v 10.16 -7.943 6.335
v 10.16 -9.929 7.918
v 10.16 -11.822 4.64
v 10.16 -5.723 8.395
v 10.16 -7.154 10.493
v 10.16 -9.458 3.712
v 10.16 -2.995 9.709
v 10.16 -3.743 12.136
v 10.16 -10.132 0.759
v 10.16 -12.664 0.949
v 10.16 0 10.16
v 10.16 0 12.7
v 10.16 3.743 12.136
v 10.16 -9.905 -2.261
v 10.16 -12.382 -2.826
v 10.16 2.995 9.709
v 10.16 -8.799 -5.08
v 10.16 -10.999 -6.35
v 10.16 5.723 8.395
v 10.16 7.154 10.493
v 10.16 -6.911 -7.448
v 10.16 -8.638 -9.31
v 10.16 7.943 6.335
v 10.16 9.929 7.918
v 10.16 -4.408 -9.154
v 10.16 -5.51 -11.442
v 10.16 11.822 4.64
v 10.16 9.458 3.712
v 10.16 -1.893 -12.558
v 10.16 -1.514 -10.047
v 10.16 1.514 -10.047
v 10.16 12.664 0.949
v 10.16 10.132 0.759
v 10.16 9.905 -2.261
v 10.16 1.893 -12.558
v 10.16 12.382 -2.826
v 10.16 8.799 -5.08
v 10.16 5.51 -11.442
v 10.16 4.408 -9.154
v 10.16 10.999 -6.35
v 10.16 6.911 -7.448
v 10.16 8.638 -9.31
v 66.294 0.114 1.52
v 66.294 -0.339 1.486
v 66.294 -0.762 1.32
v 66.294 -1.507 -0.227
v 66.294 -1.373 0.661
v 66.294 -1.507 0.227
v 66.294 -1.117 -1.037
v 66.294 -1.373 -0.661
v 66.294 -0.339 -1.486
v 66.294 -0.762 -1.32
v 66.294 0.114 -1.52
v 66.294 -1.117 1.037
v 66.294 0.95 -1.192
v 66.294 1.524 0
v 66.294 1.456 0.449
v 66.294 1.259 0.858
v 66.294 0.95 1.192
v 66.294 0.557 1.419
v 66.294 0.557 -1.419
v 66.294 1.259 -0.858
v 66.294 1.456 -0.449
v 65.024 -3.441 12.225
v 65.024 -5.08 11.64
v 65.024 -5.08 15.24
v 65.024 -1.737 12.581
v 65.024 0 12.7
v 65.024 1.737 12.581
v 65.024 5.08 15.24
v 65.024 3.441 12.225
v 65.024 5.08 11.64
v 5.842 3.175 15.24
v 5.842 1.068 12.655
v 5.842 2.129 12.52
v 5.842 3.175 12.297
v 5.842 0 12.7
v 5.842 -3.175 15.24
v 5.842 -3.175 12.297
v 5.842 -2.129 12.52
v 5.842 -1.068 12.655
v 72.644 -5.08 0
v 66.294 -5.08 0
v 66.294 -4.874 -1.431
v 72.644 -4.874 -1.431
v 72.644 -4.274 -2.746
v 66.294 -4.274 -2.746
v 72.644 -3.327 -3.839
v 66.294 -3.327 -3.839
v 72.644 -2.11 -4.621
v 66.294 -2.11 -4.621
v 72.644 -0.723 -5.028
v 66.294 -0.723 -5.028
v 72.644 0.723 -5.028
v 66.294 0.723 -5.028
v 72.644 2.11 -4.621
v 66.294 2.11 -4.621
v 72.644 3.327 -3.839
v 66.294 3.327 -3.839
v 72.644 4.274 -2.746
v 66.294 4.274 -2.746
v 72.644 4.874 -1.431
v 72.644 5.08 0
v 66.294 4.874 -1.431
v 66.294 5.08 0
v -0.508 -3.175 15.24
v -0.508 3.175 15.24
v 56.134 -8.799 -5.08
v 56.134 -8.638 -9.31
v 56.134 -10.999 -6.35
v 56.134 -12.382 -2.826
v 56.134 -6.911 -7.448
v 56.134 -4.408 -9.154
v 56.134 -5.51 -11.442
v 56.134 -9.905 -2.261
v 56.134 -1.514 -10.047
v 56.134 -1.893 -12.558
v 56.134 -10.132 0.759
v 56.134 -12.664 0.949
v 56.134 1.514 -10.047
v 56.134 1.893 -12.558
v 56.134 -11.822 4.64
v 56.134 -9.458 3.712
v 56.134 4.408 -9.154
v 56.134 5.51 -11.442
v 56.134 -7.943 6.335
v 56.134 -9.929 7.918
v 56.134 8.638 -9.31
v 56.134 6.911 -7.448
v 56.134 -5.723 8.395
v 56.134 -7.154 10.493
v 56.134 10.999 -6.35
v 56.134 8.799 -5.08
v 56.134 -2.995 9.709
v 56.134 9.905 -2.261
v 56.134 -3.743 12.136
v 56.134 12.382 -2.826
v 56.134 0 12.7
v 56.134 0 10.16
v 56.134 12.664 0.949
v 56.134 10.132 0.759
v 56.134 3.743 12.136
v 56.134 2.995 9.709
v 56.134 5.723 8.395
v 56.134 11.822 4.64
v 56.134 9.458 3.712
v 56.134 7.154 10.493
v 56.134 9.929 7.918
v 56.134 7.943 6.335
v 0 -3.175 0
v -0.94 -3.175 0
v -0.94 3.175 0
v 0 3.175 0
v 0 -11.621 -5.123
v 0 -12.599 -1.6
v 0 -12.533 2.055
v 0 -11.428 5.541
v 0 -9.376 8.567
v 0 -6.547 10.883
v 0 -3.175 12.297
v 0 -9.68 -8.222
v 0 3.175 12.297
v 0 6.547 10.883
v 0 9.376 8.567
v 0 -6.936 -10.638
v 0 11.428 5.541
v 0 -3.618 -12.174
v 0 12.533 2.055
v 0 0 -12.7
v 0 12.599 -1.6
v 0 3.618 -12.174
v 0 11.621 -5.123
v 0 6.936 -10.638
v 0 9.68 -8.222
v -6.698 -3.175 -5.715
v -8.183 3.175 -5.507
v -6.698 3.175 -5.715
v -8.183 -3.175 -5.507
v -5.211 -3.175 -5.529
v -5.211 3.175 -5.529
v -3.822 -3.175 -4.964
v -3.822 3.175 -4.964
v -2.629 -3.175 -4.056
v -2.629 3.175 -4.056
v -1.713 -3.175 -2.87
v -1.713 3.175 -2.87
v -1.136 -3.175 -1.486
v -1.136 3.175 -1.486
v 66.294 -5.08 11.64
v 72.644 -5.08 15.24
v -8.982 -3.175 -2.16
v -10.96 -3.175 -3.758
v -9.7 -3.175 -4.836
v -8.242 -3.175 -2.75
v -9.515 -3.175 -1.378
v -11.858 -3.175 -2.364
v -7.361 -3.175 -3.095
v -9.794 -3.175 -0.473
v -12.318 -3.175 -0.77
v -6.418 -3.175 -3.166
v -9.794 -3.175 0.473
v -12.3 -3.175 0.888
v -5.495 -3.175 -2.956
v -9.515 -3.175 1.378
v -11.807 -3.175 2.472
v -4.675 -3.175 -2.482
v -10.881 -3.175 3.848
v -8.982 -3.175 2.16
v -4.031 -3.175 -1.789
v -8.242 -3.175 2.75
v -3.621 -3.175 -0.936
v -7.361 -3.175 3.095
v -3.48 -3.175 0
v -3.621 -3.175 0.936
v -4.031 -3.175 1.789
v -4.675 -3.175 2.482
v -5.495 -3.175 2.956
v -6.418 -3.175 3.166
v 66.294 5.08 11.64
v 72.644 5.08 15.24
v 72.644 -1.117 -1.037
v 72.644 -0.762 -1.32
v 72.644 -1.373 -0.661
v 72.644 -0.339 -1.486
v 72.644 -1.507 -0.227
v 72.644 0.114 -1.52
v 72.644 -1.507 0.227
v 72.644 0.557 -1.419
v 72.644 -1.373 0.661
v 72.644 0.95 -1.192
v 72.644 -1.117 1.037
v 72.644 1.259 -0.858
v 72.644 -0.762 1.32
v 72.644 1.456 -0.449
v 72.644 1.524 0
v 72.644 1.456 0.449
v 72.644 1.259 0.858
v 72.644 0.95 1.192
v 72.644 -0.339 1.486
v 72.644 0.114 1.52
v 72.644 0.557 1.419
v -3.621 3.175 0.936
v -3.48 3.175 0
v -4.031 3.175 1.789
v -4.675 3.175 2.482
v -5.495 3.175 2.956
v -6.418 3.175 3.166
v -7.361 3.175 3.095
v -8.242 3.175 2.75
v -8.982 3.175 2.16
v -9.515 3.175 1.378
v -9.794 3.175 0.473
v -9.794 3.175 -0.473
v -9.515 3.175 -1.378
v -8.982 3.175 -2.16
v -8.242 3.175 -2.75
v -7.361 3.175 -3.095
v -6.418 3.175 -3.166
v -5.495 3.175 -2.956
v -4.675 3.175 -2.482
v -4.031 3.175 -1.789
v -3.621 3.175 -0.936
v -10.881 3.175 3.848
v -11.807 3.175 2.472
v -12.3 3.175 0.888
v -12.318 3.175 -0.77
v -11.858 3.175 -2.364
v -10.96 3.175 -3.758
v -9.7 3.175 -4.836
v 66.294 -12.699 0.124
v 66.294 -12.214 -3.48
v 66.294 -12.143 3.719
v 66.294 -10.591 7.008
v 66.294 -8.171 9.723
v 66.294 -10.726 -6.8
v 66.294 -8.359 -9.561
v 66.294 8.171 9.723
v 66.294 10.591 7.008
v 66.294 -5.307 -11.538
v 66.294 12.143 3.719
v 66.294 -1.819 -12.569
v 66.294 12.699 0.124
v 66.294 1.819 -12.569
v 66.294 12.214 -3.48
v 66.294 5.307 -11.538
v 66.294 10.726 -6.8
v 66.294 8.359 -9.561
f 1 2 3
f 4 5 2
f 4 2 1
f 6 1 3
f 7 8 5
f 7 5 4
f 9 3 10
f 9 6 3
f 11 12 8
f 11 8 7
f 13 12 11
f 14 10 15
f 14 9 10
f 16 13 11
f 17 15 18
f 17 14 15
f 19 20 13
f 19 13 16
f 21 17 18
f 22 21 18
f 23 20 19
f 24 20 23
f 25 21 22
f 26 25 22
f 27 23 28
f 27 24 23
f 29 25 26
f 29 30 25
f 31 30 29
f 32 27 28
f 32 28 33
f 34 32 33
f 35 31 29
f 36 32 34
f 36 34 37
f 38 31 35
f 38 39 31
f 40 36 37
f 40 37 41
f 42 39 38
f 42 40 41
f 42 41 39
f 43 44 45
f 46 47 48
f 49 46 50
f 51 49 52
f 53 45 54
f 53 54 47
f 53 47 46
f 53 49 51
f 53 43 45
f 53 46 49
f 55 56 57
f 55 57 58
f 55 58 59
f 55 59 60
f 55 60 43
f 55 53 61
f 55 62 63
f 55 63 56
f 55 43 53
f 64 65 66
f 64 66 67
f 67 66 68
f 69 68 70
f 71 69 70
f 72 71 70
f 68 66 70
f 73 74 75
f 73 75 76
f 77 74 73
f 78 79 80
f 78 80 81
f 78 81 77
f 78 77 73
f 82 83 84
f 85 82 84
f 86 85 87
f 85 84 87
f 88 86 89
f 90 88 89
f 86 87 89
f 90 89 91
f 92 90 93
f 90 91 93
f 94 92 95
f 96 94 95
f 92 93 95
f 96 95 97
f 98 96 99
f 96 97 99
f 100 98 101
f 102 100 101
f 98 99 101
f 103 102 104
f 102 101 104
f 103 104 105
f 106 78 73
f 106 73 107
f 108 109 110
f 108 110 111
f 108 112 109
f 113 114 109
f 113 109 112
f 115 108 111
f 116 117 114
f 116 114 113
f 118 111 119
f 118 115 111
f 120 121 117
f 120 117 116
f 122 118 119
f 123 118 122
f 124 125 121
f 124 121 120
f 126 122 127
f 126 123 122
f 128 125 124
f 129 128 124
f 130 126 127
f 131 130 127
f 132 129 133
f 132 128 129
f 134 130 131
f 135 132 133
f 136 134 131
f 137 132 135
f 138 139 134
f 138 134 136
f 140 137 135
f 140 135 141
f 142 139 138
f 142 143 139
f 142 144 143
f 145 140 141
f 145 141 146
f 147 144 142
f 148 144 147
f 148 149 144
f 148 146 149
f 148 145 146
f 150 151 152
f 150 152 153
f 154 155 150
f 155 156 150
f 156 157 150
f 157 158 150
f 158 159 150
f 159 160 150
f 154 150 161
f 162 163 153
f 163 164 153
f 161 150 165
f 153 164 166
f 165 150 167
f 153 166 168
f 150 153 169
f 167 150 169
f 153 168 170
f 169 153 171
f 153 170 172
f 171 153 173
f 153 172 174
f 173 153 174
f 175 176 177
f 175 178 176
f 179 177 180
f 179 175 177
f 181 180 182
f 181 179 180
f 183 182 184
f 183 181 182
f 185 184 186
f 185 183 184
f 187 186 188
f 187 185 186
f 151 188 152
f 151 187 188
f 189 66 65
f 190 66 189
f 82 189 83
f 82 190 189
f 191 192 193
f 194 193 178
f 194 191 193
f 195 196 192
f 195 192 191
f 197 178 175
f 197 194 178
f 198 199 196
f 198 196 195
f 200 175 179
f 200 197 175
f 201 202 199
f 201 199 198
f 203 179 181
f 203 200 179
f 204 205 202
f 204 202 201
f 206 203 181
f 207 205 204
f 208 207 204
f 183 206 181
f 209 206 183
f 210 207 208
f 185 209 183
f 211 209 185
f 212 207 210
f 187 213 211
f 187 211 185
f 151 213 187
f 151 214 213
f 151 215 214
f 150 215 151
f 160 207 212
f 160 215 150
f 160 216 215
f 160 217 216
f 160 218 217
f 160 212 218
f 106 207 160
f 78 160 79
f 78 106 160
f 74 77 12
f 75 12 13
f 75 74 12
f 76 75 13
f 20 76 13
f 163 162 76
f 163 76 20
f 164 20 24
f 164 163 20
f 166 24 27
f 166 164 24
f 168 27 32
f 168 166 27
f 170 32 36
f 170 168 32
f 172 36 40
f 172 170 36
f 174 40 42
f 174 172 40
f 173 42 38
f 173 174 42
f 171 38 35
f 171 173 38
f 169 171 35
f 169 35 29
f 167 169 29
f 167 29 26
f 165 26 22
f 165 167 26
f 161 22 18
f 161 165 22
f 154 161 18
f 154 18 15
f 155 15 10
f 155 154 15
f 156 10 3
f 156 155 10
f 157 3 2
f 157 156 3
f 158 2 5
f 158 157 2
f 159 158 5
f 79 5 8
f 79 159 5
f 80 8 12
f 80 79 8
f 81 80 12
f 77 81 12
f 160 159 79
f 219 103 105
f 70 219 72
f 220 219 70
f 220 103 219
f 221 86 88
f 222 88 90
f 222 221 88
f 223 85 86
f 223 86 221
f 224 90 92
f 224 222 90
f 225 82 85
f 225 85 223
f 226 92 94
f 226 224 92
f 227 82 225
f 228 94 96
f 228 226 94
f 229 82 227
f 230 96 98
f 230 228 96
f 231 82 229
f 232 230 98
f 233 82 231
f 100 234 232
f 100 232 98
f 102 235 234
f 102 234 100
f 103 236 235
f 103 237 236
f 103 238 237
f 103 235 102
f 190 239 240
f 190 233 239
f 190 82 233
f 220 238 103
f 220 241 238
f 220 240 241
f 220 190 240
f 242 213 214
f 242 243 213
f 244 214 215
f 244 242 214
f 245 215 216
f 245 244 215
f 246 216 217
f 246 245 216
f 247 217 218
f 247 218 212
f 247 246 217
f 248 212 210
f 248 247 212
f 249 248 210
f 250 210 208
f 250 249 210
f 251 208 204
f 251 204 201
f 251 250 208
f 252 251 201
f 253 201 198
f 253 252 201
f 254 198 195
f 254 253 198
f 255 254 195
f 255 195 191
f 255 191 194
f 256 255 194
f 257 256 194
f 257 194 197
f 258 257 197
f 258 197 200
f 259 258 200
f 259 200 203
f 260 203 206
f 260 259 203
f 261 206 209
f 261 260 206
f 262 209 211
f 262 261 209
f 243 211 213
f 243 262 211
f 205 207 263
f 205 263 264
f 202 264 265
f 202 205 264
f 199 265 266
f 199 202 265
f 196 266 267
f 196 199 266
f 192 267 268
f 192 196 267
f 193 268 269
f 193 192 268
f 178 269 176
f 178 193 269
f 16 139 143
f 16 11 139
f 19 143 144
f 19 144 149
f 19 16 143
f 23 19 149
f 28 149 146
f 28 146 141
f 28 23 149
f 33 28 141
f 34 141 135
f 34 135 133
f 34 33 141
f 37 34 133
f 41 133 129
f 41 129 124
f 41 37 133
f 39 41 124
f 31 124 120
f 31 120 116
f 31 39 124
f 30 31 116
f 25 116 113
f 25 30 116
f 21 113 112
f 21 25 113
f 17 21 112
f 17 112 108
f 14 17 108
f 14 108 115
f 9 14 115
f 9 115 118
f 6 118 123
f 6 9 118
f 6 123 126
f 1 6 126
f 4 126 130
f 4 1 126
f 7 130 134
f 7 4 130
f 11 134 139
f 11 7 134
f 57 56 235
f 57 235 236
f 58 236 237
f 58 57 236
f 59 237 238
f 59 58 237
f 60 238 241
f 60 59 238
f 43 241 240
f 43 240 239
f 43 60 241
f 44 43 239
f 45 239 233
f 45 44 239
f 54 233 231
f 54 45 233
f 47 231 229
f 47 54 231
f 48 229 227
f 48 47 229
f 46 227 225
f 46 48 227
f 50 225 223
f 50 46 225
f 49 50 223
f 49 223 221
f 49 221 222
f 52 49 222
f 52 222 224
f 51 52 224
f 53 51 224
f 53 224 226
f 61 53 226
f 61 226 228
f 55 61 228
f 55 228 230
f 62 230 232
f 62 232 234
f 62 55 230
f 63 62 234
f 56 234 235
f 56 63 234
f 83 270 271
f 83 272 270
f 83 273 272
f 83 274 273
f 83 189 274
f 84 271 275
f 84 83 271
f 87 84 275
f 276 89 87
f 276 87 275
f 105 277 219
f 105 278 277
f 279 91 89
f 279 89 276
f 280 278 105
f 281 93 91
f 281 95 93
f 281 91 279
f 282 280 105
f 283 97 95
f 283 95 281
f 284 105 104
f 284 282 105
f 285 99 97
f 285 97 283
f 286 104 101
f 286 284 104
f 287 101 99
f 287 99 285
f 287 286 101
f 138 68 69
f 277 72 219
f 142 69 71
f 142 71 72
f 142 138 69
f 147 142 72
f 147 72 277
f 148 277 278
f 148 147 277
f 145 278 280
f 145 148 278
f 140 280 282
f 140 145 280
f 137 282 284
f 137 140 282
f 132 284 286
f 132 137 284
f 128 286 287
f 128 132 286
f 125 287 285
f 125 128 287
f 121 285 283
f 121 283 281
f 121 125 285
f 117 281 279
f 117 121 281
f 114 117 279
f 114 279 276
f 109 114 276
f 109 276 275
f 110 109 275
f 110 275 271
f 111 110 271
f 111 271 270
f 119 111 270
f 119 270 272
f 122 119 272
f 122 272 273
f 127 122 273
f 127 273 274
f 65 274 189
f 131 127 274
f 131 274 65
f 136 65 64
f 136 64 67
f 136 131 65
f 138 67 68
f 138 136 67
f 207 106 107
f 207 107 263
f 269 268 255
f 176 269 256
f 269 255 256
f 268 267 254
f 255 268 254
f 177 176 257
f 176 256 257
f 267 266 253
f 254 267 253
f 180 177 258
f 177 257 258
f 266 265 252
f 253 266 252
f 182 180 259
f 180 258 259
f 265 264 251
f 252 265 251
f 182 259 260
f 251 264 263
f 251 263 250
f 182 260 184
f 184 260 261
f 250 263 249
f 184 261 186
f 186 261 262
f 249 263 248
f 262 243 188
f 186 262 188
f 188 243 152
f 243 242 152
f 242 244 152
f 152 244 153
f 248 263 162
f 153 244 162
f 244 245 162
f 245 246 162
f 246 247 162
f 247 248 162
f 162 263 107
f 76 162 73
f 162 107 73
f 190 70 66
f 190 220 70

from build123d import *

# Parameters (mm, degrees)
F0_W          = 5.842
F0_H          = 12.7
F0_R          = 3.175
F2_DEPTH      = 3.175
F3_R          = 1.524
F4_DEPTH      = 6.35
F4_DEPTH_BACK = 1.27


with BuildPart() as f1:
    # F0 (on Front) → F1 (revolve)
    with BuildSketch(Plane.XZ):
        Polygon((5.842, 12.7), (5.842, 0), (66.294, 0), (66.294, 12.7), (56.134, 12.7), (56.134, 10.16), (10.16, 10.16), (10.16, 12.7), align=None)
        with Locations((2.921, 6.35)):
            Rectangle(F0_W, F0_H)
    revolve(axis=Axis((33.147, 0, 0), (-1, 0, 0)))

    # F0 (on Front) → F2 (join, symmetric)
    with BuildSketch(Plane.XZ):
        with Locations((2.921, 6.35)):
            Rectangle(F0_W, F0_H)
        with BuildLine():
            Line((-0.9398, 0), (0, 0))
            Line((0, 0), (0, 12.7))
            Line((0, 12.7), (5.842, 12.7))
            Line((5.842, 12.7), (5.842, 15.24))
            Line((5.842, 15.24), (-0.508, 15.24))
            Line((-0.508, 15.24), (-10.88063, 3.847543))
            ThreePointArc((-10.88063, 3.847543), (-4.591961, 5.329721), (-0.9398, 0))
        make_face()
        with BuildLine():
            ThreePointArc((-8.182663, -5.506983), (-3.195791, -4.549339), (-0.9398, 0))
            ThreePointArc((-0.9398, 0), (-4.591961, 5.329721), (-10.88063, 3.847543))
            ThreePointArc((-10.88063, 3.847543), (-12.145978, -1.583727), (-8.182663, -5.506983))
        make_face()
        with Locations((-6.6548, 0)):
            Circle(F0_R, mode=Mode.SUBTRACT)
    extrude(amount=F2_DEPTH, both=True)

    # F3 (on face) → F4 (join, two sides)
    with BuildSketch(Plane.YZ.offset(66.294)) as f4_sk:
        with BuildLine():
            ThreePointArc((-5.08, 0), (0, -5.08), (5.08, 0))
            ThreePointArc((5.08, 0), (0, 5.08), (-5.08, 0))
        make_face()
        Circle(F3_R, mode=Mode.SUBTRACT)
        with BuildLine():
            ThreePointArc((-5.08, 0), (0, 5.08), (5.08, 0))
            Line((5.08, 0), (5.08, 15.24))
            Line((5.08, 15.24), (-5.08, 15.24))
            Line((-5.08, 15.24), (-5.08, 0))
        make_face()
    extrude(amount=F4_DEPTH)
    extrude(f4_sk.sketch, amount=-F4_DEPTH_BACK)


solid = f1.part
